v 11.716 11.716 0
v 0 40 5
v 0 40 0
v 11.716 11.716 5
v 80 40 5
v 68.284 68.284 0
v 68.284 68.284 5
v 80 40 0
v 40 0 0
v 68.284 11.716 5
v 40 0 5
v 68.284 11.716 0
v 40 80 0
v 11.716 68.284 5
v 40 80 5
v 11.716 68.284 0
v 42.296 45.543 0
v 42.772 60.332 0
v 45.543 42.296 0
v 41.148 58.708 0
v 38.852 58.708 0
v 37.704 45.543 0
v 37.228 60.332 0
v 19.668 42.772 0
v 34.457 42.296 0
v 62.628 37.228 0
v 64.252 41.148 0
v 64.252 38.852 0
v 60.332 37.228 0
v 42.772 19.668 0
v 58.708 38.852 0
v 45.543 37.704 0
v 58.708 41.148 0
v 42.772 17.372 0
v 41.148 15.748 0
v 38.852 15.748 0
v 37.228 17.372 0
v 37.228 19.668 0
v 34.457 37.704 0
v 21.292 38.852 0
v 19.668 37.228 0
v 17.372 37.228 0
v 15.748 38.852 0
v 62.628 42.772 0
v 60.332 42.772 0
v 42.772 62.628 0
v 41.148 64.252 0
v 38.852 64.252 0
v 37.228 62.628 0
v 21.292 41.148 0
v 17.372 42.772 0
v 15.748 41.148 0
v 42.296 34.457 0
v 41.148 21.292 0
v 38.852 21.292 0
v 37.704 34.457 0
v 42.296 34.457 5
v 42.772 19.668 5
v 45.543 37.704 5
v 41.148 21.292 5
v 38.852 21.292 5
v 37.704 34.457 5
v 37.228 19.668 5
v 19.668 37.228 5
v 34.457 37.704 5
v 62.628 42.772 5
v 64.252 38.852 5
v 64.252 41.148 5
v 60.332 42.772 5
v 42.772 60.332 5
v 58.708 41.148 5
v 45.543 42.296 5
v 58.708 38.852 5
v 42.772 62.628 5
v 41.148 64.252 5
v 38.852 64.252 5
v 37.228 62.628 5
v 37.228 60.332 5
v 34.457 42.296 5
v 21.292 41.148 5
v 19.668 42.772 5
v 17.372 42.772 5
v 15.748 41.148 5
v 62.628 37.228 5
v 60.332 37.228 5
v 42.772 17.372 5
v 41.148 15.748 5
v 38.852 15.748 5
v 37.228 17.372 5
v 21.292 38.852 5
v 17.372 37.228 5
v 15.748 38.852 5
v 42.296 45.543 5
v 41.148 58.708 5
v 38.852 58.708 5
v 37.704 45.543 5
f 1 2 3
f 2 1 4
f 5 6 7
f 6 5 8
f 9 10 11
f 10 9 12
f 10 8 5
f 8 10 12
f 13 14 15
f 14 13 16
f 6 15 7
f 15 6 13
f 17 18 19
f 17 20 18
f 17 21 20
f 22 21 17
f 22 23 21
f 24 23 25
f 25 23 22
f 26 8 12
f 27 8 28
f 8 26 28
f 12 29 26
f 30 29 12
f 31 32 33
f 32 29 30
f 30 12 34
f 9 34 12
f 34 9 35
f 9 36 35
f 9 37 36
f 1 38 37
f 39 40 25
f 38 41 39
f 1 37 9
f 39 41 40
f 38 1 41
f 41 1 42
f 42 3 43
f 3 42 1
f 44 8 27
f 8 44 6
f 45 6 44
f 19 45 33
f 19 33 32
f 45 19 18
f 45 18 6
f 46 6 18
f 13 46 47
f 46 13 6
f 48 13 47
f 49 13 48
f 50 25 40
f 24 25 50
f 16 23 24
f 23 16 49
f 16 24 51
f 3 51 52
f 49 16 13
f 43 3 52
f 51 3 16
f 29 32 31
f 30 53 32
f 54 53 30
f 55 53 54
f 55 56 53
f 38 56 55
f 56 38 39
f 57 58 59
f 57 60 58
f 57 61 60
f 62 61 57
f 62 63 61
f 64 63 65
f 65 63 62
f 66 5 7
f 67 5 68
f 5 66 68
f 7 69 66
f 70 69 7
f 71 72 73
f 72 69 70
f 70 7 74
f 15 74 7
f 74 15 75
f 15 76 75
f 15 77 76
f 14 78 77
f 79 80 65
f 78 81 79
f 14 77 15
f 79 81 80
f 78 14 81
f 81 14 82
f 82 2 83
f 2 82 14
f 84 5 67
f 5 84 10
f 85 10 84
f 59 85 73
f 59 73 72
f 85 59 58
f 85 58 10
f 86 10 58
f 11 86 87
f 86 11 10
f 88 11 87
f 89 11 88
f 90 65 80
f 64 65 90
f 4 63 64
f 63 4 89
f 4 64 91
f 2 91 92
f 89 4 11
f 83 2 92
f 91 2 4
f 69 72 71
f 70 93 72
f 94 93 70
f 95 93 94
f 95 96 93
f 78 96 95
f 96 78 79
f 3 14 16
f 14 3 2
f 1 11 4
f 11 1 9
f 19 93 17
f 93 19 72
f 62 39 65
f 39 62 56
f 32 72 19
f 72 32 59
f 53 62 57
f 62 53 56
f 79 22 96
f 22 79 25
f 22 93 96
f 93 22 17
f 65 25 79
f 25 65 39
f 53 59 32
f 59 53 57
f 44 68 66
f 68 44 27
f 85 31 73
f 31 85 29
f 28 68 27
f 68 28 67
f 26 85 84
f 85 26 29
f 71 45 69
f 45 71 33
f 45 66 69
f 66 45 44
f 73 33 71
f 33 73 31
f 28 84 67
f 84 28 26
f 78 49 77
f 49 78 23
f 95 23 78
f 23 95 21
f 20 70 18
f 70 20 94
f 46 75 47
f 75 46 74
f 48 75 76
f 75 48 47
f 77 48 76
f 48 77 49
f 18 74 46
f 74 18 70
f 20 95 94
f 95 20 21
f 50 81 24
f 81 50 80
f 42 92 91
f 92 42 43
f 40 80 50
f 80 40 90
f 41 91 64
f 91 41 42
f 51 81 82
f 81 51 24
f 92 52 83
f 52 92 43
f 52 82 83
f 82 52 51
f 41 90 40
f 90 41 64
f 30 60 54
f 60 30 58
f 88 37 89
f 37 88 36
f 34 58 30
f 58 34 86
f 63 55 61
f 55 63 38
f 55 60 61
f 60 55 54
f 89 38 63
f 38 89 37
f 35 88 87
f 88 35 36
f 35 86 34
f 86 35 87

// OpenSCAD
$fn = 32;

// ----------------------------------------------------------------------
// Polygon plate: 8-gon R40, 4 bolt windows
// ----------------------------------------------------------------------

// --- parameters (mm) ---
sides = 8;                // number of polygon sides
plate_r = 40;             // circumscribed radius of the polygon
bore_r = 6;               // centre bore radius
bolts = 4;                // number of bolt windows
ring_r = 21.48;           // bolt-circle radius
bolt_r = 3;               // bolt window radius
plate_t = 5;              // plate thickness, Z (extrusion height)

plate_d = 2 * plate_r;  // circumscribed diameter
bore_d = 2 * bore_r;  // centre bore diameter
bolt_d = 2 * bolt_r;  // bolt window diameter
ring_d = 2 * ring_r;  // bolt-circle diameter

profile = [[80, 40], [68.284, 68.284], [40, 80], [11.716, 68.284], [0, 40], [11.716, 11.716], [40, 0], [68.284, 11.716]];  // primary outline, 8 points, counter clockwise
void_1 = [[45.543, 42.296], [42.296, 45.543], [37.704, 45.543], [34.457, 42.296], [34.457, 37.704], [37.704, 34.457], [42.296, 34.457], [45.543, 37.704]];  // centre bore, 8 points
void_2 = [[64.252, 41.148], [62.628, 42.772], [60.332, 42.772], [58.708, 41.148], [58.708, 38.852], [60.332, 37.228], [62.628, 37.228], [64.252, 38.852]];  // bolt window 1, 8 points
void_3 = [[42.772, 62.628], [41.148, 64.252], [38.852, 64.252], [37.228, 62.628], [37.228, 60.332], [38.852, 58.708], [41.148, 58.708], [42.772, 60.332]];  // bolt window 2, 8 points
void_4 = [[21.292, 41.148], [19.668, 42.772], [17.372, 42.772], [15.748, 41.148], [15.748, 38.852], [17.372, 37.228], [19.668, 37.228], [21.292, 38.852]];  // bolt window 3, 8 points
void_5 = [[42.772, 19.668], [41.148, 21.292], [38.852, 21.292], [37.228, 19.668], [37.228, 17.372], [38.852, 15.748], [41.148, 15.748], [42.772, 17.372]];  // bolt window 4, 8 points

// --- the one profile operation ---
difference() {
  linear_extrude(height = plate_t) polygon(points = profile);
  translate([0, 0, -1])
    linear_extrude(height = plate_t + 2) polygon(points = void_1);
  translate([0, 0, -1])
    linear_extrude(height = plate_t + 2) polygon(points = void_2);
  translate([0, 0, -1])
    linear_extrude(height = plate_t + 2) polygon(points = void_3);
  translate([0, 0, -1])
    linear_extrude(height = plate_t + 2) polygon(points = void_4);
  translate([0, 0, -1])
    linear_extrude(height = plate_t + 2) polygon(points = void_5);
}
